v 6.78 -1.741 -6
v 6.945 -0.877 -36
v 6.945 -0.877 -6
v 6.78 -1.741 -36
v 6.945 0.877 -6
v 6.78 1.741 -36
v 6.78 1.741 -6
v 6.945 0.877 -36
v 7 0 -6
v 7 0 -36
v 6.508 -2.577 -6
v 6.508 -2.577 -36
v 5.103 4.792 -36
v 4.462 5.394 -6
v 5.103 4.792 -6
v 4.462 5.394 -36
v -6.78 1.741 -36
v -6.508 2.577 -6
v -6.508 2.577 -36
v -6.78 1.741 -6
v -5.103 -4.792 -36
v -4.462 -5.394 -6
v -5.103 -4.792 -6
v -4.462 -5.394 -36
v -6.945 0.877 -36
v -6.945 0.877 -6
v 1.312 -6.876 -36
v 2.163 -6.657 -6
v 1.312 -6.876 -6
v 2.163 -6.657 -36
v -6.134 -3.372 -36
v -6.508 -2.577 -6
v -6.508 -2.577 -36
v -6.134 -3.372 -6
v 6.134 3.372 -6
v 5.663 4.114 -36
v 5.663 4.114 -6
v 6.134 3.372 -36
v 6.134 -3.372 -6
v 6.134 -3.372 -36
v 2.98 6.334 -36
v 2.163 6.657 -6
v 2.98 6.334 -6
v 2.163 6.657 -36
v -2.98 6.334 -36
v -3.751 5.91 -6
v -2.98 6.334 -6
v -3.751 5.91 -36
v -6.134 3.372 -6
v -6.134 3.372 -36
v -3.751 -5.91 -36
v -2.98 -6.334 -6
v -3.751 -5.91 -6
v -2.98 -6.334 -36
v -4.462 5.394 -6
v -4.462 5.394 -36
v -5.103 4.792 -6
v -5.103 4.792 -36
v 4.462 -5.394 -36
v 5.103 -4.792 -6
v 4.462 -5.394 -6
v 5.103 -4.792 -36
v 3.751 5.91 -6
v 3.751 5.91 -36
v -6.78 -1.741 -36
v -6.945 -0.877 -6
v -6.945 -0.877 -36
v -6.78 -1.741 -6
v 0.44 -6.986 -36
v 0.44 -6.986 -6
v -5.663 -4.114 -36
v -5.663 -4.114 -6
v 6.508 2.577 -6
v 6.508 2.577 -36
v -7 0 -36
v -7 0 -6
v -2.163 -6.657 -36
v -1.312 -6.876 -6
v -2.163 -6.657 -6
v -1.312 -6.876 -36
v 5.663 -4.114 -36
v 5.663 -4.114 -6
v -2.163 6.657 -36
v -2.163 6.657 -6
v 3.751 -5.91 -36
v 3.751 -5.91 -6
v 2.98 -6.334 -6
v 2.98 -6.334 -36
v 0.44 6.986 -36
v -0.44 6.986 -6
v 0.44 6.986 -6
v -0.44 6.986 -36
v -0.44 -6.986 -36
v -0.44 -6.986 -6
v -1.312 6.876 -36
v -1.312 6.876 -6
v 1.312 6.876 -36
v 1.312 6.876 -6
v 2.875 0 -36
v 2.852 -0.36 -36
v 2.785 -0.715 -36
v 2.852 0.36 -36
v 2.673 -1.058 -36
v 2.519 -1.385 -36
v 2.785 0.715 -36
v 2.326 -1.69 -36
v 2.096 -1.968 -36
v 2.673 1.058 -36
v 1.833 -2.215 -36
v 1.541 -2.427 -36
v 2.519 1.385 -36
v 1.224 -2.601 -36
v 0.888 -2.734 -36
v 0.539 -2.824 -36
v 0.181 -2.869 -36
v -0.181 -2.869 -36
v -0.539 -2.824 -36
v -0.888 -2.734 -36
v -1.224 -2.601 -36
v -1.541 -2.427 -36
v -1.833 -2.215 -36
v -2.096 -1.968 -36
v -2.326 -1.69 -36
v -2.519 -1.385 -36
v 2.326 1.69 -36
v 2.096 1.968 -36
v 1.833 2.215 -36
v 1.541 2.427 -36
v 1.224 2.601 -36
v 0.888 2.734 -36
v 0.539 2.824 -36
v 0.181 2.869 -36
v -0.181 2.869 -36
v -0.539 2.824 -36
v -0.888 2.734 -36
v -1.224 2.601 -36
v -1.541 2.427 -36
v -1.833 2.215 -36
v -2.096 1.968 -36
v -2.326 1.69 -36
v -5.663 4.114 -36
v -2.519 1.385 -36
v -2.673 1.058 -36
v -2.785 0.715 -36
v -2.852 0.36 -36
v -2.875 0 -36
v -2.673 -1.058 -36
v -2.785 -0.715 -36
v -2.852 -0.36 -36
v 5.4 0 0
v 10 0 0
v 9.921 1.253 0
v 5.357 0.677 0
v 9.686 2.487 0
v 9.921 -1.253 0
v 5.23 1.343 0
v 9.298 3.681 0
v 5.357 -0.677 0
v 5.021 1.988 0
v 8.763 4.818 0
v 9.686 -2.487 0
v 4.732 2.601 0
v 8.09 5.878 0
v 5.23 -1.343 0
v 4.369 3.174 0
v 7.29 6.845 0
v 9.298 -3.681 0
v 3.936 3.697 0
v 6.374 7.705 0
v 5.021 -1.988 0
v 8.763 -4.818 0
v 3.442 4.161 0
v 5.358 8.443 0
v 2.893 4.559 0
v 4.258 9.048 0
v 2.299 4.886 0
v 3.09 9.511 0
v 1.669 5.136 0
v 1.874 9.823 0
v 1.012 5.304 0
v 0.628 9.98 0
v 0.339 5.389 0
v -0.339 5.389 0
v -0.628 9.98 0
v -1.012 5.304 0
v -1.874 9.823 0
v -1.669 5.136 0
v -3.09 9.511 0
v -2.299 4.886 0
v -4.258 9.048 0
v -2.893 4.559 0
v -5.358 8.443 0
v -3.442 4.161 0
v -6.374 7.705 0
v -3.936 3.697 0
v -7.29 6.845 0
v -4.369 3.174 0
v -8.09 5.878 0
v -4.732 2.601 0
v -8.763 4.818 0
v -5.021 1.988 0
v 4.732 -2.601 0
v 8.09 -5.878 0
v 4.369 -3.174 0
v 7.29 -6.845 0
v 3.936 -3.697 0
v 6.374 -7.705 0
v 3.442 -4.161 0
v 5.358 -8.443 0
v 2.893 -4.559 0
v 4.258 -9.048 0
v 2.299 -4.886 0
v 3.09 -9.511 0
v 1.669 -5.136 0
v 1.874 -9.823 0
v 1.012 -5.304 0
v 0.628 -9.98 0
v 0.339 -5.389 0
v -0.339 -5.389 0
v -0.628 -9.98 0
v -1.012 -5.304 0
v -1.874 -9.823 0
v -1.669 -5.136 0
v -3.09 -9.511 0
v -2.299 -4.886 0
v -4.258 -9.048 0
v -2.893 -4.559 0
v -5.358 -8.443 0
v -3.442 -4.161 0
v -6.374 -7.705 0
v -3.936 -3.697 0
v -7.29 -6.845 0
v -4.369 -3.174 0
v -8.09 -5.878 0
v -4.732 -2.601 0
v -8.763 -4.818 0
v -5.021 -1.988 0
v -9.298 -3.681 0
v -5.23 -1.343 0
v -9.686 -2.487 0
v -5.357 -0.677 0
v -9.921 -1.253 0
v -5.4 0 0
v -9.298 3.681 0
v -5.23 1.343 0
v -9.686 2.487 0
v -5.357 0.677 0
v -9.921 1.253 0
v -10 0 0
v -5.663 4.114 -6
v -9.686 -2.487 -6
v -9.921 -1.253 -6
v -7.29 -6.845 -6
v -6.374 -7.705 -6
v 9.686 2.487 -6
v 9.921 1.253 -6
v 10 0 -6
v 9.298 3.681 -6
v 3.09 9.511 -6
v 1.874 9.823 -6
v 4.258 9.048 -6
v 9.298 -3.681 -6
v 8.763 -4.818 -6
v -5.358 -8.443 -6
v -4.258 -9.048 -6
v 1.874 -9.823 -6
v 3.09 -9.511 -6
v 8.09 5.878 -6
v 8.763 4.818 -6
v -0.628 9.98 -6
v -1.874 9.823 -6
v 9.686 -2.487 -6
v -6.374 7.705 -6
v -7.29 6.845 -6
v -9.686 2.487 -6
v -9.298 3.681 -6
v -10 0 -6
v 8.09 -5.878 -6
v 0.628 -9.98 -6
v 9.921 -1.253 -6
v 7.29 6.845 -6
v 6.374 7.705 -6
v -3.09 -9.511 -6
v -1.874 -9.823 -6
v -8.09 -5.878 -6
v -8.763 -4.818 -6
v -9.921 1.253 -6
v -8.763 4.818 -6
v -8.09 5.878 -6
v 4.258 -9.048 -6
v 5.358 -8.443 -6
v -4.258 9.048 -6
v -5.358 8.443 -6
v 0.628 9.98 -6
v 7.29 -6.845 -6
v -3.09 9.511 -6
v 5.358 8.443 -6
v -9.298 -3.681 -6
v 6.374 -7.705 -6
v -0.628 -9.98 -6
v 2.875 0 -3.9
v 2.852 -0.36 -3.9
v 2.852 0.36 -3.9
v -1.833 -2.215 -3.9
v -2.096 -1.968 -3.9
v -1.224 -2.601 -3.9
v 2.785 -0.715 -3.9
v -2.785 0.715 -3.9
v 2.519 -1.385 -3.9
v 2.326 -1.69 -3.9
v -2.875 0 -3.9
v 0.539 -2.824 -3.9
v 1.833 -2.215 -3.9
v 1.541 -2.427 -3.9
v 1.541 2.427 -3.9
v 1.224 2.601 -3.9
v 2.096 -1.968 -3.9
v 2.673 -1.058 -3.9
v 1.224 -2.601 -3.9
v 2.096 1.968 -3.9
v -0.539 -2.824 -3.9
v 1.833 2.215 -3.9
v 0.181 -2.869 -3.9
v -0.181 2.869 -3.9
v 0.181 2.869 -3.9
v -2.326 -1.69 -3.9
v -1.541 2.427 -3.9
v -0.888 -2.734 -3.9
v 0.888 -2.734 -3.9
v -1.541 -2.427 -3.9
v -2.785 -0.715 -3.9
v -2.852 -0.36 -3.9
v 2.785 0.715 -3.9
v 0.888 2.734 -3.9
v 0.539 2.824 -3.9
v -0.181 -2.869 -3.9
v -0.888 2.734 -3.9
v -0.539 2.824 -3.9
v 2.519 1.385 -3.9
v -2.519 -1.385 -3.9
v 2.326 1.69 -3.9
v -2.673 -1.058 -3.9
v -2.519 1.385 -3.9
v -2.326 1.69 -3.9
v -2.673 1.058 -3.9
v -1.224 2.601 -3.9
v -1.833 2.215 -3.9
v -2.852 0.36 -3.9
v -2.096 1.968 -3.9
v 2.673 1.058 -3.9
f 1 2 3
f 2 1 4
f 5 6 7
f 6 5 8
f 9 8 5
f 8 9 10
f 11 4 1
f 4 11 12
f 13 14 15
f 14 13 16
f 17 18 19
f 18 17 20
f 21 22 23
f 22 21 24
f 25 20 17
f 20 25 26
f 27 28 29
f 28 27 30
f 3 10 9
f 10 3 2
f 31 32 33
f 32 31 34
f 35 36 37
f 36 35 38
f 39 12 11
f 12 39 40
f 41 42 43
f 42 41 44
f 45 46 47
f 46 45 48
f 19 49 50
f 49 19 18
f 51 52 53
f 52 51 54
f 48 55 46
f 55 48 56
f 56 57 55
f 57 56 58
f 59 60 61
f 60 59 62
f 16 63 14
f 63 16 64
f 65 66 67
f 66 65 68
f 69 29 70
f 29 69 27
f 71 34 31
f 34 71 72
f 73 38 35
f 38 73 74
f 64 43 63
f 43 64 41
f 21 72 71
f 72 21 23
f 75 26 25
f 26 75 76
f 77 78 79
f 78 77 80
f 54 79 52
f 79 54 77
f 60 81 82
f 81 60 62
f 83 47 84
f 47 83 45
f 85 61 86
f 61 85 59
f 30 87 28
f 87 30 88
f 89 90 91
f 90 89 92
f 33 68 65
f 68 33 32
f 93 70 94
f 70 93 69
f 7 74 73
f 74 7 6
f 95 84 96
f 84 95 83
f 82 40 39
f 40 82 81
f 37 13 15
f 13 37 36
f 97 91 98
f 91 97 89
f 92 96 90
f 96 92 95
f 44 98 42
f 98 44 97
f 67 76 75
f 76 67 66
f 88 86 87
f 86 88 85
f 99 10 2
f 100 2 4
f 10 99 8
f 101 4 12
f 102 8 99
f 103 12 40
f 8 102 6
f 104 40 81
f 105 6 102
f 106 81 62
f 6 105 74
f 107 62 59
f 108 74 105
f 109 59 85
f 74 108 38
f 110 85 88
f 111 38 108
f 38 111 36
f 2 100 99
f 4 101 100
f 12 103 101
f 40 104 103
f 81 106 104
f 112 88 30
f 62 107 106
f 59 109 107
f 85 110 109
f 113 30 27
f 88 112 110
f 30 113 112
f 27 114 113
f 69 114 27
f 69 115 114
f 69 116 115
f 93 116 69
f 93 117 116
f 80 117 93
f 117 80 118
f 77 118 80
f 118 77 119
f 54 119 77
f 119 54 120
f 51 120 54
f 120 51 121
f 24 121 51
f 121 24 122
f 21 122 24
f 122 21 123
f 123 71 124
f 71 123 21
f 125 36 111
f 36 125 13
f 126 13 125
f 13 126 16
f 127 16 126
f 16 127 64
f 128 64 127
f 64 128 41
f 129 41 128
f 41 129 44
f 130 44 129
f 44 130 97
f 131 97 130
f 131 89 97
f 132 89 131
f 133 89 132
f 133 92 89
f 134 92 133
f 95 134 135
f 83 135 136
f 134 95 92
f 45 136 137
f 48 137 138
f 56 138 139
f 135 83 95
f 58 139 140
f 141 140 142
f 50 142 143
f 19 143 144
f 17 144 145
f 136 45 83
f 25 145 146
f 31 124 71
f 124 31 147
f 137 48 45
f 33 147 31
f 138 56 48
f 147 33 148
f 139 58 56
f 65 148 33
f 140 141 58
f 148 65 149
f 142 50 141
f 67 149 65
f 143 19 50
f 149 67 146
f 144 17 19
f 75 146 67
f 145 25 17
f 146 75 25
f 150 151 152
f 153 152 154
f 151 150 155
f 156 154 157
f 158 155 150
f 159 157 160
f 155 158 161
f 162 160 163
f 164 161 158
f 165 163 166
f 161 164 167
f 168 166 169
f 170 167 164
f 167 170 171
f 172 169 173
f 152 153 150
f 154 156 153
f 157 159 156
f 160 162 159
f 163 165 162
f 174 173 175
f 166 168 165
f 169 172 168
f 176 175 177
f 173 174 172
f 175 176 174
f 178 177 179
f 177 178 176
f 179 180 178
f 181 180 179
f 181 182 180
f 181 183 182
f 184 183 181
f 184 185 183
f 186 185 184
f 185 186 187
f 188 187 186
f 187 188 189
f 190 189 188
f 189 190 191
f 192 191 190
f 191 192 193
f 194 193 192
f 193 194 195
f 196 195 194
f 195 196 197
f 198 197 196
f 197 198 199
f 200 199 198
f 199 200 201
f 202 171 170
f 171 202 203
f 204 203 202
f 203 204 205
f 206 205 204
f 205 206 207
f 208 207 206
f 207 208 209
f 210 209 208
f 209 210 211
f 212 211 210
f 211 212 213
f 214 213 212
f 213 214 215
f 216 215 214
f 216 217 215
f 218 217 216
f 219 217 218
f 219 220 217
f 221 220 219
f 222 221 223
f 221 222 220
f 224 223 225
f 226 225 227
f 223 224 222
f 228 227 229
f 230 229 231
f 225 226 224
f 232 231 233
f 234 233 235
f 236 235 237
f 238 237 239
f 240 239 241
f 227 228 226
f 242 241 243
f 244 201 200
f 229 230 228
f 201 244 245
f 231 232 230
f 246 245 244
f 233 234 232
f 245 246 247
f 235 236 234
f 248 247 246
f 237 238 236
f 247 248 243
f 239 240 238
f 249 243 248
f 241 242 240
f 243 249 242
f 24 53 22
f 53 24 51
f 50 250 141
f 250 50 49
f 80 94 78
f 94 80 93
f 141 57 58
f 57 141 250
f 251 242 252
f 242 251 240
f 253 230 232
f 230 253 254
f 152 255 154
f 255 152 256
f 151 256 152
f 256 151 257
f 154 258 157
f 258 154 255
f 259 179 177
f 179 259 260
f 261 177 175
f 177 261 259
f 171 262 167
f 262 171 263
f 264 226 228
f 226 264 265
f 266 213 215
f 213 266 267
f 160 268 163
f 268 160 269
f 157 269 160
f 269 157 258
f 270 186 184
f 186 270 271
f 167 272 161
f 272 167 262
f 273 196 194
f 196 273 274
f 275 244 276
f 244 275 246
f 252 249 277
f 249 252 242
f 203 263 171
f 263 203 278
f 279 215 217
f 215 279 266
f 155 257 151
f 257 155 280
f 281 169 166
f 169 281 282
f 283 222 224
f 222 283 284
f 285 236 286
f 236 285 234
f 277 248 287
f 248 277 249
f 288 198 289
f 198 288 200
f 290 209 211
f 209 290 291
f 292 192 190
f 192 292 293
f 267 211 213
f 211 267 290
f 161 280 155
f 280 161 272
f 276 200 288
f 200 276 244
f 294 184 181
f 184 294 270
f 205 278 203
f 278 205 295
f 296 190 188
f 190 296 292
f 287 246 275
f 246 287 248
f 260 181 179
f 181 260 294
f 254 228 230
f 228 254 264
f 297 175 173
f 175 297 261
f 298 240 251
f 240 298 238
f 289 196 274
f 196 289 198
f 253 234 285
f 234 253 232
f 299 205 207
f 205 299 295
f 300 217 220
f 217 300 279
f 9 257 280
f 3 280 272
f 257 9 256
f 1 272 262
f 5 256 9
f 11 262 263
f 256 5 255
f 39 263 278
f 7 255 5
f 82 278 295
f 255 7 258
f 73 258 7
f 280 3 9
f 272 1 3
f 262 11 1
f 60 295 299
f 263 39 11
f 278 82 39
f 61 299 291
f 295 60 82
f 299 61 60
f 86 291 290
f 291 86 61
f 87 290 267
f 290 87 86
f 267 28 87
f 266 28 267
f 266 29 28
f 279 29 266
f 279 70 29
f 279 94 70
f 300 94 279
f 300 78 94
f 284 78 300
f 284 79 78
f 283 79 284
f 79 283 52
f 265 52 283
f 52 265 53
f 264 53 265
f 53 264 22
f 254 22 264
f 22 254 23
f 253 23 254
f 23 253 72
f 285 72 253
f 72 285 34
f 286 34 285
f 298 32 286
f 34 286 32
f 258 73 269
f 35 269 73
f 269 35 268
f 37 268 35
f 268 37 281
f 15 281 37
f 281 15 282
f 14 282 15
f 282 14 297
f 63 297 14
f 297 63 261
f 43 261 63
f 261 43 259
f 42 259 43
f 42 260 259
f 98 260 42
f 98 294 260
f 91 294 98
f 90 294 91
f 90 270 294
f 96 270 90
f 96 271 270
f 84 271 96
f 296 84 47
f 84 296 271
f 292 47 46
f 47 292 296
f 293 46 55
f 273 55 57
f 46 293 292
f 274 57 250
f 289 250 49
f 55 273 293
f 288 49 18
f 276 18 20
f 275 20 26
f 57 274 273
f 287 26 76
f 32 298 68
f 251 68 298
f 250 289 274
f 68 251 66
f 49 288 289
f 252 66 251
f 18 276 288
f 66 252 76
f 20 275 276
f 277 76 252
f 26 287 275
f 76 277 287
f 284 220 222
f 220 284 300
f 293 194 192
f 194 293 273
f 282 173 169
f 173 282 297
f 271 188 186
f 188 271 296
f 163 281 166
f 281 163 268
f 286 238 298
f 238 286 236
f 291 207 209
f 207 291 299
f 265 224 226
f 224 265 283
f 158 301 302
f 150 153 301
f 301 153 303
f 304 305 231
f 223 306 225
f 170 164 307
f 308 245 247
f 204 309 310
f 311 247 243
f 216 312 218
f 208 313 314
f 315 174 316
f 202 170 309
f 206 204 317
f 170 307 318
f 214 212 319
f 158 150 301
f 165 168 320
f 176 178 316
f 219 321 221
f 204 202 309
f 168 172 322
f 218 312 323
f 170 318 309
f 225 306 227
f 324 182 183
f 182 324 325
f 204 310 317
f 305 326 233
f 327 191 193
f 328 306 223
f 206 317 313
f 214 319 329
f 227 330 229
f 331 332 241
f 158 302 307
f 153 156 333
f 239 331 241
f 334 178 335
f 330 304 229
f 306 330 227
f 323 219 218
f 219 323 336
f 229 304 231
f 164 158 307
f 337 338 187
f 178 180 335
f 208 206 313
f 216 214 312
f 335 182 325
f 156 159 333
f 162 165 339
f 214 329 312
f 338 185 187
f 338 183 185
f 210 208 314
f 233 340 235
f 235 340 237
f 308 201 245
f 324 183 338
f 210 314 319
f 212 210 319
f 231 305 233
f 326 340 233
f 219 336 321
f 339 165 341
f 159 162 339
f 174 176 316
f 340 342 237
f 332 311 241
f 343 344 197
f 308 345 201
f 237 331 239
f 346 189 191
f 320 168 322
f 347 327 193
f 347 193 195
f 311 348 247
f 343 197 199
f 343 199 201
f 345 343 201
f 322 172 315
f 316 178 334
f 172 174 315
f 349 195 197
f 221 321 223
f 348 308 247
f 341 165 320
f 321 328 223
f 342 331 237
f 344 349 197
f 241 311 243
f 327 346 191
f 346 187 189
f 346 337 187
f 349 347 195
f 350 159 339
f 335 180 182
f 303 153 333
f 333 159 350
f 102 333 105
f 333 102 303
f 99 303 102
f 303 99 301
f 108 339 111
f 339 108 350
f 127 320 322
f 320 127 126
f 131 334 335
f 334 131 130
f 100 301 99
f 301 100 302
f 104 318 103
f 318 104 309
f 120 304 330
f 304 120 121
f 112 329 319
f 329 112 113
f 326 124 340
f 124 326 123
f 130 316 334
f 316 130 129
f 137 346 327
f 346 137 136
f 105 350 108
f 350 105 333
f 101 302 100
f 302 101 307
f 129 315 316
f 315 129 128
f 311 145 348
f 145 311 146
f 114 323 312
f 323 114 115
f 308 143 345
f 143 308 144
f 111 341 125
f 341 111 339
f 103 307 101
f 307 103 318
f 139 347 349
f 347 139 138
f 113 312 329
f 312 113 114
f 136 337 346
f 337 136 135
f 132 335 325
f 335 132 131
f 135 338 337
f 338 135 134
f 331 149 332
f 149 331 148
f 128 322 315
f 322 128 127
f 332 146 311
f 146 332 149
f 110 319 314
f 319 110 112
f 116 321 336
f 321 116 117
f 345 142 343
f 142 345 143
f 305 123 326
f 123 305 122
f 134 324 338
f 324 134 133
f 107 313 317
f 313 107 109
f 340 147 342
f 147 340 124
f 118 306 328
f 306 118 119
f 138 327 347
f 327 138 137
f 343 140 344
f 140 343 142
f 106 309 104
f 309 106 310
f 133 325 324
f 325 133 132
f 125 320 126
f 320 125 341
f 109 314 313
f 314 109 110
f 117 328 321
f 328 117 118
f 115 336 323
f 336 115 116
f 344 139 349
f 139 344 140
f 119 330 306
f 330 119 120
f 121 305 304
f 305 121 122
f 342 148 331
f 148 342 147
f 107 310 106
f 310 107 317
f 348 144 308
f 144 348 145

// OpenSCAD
$fn = 50;


difference() {
	union() {
		translate(v = [0, 0, -36.0000000000]) {
			cylinder(h = 36, r = 7.0000000000);
		}
		translate(v = [0, 0, -6.0000000000]) {
			cylinder(h = 6, r = 10.0000000000);
		}
	}
	union() {
		translate(v = [0, 0, 0]) {
			rotate(a = [0, 0, 0]) {
				difference() {
					union() {
						#translate(v = [0, 0, -36.0000000000]) {
							cylinder(h = 36, r = 2.6000000000);
						}
						#translate(v = [0, 0, -3.9000000000]) {
							cylinder(h = 3.9000000000, r1 = 2.8750000000, r2 = 5.4000000000);
						}
						#translate(v = [0, 0, -36.0000000000]) {
							cylinder(h = 36, r = 2.8750000000);
						}
						#translate(v = [0, 0, -36.0000000000]) {
							cylinder(h = 36, r = 2.6000000000);
						}
					}
					union();
				}
			}
		}
	}
}
